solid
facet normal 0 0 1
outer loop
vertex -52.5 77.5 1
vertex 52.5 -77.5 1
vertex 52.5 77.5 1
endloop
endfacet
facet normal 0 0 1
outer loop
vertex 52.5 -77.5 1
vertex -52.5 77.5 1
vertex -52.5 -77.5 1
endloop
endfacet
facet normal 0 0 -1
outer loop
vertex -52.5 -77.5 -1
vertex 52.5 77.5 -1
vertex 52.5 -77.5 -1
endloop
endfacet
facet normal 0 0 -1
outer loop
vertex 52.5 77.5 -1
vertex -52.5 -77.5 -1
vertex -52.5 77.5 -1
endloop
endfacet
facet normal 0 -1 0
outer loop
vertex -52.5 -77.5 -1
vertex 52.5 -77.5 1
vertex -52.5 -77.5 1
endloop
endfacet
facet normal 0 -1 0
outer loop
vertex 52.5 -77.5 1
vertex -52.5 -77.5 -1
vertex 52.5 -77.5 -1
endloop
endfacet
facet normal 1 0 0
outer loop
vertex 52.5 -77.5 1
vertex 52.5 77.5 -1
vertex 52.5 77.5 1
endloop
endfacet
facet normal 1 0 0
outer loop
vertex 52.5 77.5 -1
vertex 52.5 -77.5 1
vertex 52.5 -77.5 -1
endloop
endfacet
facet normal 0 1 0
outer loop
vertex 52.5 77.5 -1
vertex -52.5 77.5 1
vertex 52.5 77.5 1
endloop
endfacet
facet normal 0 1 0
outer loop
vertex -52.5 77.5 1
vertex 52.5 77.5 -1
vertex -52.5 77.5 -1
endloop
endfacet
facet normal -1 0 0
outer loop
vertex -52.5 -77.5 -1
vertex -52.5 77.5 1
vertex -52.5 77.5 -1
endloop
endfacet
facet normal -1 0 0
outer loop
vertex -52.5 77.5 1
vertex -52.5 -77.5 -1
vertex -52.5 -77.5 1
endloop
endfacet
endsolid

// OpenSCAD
// ========================================
// a 105 x 155 x 2 mm plate
// NeuroCAD canonical IR; dimensions are millimetres
// ========================================
$fn = 48;

cube(size=[105, 155, 2], center=true);
